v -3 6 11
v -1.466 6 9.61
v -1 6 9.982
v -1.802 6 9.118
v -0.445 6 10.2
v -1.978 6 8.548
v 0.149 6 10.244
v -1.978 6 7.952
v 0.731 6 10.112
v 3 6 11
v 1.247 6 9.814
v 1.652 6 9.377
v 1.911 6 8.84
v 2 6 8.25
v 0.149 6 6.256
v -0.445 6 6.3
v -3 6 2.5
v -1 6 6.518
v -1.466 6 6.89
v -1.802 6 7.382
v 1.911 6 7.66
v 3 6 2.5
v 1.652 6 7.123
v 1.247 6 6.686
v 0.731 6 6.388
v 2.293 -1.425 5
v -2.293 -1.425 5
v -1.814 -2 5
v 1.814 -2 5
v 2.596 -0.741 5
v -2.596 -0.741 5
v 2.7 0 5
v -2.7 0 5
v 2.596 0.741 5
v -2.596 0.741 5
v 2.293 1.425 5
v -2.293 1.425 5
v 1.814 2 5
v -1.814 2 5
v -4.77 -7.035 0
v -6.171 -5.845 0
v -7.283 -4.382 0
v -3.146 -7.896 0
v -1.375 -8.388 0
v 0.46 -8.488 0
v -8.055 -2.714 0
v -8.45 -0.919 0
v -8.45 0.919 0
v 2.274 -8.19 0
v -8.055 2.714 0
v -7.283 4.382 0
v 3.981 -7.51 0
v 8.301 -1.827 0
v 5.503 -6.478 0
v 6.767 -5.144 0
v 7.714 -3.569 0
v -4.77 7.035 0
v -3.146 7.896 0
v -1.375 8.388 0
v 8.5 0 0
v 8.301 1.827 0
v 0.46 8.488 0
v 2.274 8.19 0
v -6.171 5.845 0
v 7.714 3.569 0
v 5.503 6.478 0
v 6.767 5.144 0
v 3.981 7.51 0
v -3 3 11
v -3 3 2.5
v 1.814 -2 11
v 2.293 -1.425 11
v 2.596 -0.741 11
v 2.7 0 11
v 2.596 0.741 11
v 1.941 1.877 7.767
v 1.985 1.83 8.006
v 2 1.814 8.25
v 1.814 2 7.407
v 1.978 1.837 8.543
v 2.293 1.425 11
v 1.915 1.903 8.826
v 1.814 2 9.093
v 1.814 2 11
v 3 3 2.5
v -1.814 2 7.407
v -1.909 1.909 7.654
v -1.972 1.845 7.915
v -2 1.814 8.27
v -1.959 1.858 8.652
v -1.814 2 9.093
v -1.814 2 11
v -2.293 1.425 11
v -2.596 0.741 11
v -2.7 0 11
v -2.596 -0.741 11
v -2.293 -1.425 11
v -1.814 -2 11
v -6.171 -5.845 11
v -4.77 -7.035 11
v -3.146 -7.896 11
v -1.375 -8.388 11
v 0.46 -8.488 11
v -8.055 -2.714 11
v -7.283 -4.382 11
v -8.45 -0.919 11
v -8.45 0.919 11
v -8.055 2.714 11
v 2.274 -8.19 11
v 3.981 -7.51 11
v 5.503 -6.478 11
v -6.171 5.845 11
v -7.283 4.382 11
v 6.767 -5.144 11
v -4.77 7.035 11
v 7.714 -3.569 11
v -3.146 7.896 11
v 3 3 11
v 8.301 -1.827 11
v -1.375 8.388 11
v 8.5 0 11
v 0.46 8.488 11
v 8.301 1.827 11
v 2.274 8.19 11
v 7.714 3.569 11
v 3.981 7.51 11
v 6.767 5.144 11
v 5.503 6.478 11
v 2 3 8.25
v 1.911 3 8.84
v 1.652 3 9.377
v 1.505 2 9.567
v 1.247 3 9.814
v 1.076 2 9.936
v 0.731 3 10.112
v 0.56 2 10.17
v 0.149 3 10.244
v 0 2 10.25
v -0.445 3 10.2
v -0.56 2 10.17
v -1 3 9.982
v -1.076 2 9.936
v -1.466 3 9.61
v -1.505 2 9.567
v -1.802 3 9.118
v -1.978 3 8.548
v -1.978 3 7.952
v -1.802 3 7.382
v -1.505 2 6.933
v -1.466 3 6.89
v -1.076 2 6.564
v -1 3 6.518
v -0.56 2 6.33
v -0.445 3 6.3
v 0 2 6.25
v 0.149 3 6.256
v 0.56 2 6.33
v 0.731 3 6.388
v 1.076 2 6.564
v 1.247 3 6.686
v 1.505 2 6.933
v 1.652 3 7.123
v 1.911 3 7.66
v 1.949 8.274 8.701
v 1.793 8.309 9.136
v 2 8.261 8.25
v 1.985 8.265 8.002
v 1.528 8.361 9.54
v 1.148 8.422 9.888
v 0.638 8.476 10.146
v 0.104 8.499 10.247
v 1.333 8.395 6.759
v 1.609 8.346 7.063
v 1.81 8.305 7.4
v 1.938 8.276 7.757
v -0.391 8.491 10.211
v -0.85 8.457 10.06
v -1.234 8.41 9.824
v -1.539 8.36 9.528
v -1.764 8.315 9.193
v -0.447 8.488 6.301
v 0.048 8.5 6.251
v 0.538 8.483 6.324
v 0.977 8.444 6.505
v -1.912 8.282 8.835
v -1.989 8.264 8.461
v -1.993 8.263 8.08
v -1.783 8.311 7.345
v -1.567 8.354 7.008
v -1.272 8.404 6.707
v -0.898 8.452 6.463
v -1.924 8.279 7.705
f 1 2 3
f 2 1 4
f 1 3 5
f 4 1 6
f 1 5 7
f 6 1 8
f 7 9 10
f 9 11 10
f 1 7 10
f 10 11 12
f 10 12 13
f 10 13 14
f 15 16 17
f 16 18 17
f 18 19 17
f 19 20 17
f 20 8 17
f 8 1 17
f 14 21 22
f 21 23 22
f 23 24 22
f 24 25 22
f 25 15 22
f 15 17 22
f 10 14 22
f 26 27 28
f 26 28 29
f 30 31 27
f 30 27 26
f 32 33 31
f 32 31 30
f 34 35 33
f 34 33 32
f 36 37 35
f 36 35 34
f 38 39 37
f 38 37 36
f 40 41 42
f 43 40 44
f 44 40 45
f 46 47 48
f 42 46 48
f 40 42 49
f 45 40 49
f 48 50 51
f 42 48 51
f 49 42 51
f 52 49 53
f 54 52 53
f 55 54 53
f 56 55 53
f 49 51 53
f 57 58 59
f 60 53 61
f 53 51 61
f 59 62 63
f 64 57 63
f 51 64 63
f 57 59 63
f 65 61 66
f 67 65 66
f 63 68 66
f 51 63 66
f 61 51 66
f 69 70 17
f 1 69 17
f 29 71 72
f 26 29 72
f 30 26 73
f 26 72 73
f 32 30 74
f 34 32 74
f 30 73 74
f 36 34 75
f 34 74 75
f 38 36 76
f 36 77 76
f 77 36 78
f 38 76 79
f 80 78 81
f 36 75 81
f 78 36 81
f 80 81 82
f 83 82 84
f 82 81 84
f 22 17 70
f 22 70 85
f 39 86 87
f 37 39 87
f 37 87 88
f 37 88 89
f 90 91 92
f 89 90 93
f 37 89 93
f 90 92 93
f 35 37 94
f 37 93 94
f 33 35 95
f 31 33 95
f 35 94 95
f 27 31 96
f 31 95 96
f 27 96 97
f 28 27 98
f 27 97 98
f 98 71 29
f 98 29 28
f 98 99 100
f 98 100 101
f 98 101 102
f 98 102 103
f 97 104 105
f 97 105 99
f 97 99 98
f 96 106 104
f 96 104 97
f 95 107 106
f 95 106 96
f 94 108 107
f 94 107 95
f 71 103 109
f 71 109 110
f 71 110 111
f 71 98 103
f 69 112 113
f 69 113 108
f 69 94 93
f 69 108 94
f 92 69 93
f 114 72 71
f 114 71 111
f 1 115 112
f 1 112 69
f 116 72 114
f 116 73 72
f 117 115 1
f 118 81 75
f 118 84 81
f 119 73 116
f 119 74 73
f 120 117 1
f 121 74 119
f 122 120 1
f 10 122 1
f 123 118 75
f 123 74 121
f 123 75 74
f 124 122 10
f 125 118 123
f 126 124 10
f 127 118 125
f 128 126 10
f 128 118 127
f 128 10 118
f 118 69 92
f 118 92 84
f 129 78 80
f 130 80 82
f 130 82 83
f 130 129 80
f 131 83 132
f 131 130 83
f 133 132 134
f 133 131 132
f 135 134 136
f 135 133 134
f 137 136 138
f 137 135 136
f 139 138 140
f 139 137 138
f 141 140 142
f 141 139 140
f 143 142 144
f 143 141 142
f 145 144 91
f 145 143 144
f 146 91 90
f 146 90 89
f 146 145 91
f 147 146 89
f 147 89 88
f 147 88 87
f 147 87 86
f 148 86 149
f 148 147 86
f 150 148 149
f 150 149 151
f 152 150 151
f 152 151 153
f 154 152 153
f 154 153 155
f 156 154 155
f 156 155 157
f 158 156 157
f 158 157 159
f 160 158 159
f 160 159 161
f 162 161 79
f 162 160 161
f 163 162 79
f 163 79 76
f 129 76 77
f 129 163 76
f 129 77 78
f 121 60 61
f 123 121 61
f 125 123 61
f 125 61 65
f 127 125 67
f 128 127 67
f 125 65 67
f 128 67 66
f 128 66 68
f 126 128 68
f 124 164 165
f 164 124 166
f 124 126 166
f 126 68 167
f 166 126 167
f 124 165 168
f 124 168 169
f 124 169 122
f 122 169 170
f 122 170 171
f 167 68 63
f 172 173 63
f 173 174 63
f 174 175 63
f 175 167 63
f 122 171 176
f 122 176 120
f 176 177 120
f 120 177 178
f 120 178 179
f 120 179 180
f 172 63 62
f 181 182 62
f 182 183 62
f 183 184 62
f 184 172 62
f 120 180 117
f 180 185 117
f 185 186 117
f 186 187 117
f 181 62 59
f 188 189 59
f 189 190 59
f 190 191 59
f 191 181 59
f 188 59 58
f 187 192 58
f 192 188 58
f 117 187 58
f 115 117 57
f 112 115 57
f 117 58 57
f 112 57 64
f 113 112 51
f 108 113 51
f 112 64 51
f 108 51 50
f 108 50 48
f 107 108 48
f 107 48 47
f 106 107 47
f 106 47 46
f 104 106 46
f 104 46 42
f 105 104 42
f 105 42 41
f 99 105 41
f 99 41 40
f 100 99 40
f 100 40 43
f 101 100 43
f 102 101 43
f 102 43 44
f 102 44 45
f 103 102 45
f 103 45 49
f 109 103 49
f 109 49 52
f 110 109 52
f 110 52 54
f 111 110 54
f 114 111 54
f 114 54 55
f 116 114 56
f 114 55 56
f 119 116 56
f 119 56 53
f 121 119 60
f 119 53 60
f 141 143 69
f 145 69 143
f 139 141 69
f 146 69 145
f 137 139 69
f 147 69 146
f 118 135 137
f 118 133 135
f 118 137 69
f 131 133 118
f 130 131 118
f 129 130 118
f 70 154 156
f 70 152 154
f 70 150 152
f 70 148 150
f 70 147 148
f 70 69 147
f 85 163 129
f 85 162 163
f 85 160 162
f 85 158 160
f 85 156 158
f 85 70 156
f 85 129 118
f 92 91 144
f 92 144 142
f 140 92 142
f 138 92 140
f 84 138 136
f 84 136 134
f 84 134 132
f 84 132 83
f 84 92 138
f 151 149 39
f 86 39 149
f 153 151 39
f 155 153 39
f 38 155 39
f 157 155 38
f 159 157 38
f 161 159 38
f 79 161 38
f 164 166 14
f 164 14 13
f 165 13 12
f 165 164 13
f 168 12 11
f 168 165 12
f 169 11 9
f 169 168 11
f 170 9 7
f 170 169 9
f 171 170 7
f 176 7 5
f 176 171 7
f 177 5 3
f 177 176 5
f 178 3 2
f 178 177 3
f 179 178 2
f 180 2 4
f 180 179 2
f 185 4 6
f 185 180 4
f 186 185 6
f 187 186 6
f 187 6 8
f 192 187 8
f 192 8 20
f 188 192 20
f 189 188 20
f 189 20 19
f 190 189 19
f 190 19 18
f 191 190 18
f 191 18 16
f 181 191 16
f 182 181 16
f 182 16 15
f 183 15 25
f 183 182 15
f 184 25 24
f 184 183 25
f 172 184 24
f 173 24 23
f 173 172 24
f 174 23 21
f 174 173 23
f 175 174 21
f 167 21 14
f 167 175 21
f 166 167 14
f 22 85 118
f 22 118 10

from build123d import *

# Parameters (mm, degrees)
CYLINDER002_R     = 2
CYLINDER002_DEPTH = 10
BOX_W             = 6
BOX_H             = 3
BOX_DEPTH         = 10
CYLINDER_R        = 8.5
CYLINDER_DEPTH    = 11
POCKET_DEPTH      = 6


with BuildPart() as cilindro002:
    # Cylinder002 → Cylinder002 (new body)
    with BuildSketch(Plane(origin=(0, 10.2, 8.25), x_dir=(1, 0, 0), z_dir=(0, -1, 0))):
        Circle(CYLINDER002_R)
    extrude(amount=CYLINDER002_DEPTH)


with BuildPart() as cubo:
    # Box → Box (new body)
    with BuildSketch(Plane(origin=(-3, 3, 2.5), x_dir=(1, 0, 0), z_dir=(0, 0, 1))):
        with Locations((3, 1.5)):
            Rectangle(BOX_W, BOX_H)
    extrude(amount=BOX_DEPTH)


with BuildPart() as body:
    # Cylinder → Cylinder (new body)
    with BuildSketch(Plane.XY):
        Circle(CYLINDER_R)
    extrude(amount=CYLINDER_DEPTH)

    # Cut: cut Cubo
    add(cubo.part, mode=Mode.SUBTRACT)

    # Cut002: cut Cilindro002
    add(cilindro002.part, mode=Mode.SUBTRACT)


with BuildPart() as body_1:
    # Cut002 placement: moved
    add(body.part.moved(Location((0, 0, -1))))


with BuildPart() as body_2:
    # BaseFeature placement: moved
    add(body_1.part.moved(Location((0, 0, 1))))

    # Sketch → Pocket (cut)
    with BuildSketch(Plane.XY.offset(11)):
        with BuildLine():
            ThreePointArc((-1.813836, 2), (-2.7, 0), (-1.813836, -2))
            Line((1.813836, -2), (-1.813836, -2))
            ThreePointArc((1.813836, -2), (2.7, 0), (1.813836, 2))
            Line((-1.813836, 2), (1.813836, 2))
        make_face()
    extrude(amount=-POCKET_DEPTH, mode=Mode.SUBTRACT)


solid = body_2.part
